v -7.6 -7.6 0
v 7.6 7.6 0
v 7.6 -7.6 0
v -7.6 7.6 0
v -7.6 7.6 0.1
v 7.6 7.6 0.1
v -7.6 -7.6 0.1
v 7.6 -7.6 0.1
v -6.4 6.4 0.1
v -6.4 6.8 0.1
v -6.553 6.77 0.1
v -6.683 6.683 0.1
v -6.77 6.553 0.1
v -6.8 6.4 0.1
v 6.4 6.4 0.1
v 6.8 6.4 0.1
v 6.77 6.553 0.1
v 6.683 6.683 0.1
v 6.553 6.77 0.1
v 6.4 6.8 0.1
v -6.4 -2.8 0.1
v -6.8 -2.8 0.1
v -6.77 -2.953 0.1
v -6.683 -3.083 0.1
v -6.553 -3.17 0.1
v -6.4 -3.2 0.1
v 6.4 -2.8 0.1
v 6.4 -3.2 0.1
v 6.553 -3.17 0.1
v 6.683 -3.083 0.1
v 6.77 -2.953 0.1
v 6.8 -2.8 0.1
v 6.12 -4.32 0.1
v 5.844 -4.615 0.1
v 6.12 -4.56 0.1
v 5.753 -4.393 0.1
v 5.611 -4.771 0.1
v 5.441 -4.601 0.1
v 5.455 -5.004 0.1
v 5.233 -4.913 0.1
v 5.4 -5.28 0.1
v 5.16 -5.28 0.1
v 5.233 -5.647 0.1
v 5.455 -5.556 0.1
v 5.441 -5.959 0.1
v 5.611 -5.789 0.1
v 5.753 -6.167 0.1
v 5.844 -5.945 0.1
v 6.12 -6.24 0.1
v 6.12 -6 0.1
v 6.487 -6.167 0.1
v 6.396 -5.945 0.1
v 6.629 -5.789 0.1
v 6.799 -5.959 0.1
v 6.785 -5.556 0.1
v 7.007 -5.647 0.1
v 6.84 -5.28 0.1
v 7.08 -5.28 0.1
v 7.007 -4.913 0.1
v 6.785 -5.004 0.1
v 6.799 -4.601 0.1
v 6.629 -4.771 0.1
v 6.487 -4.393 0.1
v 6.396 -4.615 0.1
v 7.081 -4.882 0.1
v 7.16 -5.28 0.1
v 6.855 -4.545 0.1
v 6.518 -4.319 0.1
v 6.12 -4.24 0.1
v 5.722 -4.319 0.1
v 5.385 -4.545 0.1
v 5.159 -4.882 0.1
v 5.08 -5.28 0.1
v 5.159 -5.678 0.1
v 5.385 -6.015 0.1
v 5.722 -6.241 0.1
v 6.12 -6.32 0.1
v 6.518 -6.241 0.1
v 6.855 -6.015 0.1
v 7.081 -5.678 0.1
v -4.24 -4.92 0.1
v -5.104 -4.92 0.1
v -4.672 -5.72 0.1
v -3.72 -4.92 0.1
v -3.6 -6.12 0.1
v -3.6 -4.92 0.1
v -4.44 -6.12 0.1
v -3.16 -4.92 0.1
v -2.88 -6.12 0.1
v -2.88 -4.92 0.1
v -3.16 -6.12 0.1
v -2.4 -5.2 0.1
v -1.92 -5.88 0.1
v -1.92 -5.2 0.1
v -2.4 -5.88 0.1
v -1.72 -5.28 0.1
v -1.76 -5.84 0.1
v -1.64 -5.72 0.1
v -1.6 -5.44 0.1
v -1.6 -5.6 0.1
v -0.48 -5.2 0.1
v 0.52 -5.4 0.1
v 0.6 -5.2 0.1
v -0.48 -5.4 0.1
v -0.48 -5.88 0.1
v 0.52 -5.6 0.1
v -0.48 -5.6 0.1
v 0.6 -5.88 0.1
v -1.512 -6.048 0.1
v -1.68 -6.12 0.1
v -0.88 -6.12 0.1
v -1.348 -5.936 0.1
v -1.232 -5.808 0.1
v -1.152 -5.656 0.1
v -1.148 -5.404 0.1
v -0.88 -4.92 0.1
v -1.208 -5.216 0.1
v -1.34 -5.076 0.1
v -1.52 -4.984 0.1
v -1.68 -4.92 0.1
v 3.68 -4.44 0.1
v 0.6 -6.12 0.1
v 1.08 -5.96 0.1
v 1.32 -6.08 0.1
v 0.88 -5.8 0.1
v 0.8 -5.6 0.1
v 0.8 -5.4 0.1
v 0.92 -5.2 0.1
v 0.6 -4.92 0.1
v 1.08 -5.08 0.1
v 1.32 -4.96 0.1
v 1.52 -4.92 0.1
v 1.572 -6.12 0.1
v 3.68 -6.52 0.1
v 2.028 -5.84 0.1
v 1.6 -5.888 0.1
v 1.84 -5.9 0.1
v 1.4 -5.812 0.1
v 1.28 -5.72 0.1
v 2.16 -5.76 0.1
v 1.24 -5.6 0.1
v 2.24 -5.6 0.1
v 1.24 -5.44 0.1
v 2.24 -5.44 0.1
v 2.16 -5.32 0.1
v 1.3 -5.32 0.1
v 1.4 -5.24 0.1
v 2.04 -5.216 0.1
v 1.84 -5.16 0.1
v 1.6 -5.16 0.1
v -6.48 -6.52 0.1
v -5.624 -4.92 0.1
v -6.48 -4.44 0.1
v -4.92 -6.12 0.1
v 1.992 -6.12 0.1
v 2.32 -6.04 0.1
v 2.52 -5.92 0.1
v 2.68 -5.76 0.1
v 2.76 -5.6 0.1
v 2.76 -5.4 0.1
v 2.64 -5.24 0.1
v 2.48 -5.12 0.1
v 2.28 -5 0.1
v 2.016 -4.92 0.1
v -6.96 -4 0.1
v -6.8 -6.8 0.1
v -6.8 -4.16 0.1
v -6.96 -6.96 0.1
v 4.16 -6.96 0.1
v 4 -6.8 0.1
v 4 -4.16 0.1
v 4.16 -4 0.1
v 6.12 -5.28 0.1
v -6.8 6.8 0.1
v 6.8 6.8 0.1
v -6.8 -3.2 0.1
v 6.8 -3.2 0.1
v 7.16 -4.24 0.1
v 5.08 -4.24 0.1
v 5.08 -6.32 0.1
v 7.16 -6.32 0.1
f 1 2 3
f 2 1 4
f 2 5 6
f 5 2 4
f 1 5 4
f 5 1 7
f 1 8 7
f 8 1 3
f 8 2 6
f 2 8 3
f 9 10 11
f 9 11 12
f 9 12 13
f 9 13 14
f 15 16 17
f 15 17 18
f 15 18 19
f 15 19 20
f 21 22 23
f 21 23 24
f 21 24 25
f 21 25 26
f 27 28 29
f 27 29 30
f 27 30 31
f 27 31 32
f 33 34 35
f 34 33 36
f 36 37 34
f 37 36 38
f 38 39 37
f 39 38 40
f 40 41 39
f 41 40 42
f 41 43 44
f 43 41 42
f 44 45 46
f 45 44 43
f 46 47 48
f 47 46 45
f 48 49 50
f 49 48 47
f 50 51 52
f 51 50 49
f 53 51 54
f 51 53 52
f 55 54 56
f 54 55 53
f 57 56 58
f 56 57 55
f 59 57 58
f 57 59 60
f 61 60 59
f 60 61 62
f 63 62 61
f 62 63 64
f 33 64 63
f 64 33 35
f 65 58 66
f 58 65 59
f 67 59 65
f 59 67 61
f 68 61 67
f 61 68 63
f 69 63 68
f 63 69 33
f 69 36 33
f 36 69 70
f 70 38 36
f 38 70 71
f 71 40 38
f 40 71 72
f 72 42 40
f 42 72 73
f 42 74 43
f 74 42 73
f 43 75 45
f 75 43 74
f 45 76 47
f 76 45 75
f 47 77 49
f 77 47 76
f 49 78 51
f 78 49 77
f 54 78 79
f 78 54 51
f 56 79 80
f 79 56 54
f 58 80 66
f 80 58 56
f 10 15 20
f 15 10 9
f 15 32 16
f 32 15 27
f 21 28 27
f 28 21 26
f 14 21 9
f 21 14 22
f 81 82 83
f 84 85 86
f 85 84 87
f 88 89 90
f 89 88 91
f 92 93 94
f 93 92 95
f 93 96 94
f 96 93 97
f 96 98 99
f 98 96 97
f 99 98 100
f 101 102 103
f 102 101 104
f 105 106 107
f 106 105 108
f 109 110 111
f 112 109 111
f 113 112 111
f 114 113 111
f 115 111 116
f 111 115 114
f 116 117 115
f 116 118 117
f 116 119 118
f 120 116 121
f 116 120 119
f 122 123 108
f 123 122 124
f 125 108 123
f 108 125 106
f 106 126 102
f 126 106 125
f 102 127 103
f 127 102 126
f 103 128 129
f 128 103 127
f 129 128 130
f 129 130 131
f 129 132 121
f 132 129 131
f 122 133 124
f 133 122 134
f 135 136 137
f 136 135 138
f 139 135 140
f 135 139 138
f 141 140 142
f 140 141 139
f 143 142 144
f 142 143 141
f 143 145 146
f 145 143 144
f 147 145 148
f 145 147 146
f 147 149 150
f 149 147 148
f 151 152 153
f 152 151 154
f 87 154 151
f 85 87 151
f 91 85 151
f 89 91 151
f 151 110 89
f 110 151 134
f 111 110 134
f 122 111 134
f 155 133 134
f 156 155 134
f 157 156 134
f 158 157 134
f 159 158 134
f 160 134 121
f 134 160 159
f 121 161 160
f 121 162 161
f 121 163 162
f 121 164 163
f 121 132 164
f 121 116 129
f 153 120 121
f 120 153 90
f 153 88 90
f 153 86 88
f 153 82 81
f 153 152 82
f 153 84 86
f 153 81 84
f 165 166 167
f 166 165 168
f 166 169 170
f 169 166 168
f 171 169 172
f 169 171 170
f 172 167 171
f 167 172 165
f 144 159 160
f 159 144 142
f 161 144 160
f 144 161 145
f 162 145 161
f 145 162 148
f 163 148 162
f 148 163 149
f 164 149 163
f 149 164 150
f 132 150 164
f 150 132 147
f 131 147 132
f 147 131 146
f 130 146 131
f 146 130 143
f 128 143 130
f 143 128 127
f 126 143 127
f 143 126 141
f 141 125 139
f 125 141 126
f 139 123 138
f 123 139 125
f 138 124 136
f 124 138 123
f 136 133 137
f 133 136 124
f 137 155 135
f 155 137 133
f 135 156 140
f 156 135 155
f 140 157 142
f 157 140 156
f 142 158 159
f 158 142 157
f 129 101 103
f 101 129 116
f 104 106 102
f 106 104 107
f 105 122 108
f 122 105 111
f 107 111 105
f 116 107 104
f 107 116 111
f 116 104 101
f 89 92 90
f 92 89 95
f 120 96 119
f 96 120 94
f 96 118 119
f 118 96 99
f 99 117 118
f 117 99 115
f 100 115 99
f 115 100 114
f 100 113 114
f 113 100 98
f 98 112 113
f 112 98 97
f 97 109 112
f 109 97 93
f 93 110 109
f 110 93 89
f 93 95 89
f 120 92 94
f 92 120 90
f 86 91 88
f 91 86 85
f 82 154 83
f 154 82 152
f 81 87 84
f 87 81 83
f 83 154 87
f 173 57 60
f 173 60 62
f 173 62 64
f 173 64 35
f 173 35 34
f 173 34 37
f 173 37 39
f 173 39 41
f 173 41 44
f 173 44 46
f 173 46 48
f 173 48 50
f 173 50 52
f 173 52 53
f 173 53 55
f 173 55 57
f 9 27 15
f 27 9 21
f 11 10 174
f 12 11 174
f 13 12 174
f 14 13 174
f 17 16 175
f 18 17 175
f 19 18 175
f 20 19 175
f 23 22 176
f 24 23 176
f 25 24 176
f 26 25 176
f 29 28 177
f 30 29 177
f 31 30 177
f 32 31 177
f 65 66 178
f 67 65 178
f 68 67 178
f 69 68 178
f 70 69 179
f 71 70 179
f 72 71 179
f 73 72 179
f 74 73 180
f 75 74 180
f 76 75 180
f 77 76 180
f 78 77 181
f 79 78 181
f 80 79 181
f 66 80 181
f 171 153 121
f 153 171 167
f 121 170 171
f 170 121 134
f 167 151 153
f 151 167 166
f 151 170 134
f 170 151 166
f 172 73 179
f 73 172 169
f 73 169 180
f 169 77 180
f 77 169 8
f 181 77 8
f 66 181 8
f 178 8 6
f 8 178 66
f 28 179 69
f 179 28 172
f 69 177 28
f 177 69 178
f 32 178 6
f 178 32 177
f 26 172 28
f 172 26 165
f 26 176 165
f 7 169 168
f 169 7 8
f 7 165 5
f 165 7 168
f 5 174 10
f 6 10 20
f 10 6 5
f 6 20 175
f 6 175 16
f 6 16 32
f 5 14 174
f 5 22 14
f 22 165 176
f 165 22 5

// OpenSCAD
// file: ../p/box5-12.scad
use <../lib.scad>
function ldraw_lib__box5_12() = [
// 0 Box with 5 Faces without Any Edges
// 0 Name: box5-12.dat
// 0 Author: Chris Dee [cwdee]
// 0 !LDRAW_ORG Primitive UPDATE 2009-02
// 0 !LICENSE Licensed under CC BY 4.0 : see CAreadme.txt
// 
// 0 BFC CERTIFY CCW
  [0,"BFC","CERTIFY"],
  [0,"BFC","CCW"],
// 
// 0 !HISTORY 2009-09-03 [PTadmin] Official Update 2009-02
// 
// 
// 4 16 1 1 1 1 1 -1 -1 1 -1 -1 1 1
  [4,16,1,1,1,1,1,-1,-1,1,-1,-1,1,1],
// 4 16 -1 0 1 1 0 1 1 1 1 -1 1 1
  [4,16,-1,0,1,1,0,1,1,1,1,-1,1,1],
// 4 16 -1 0 -1 -1 0 1 -1 1 1 -1 1 -1
  [4,16,-1,0,-1,-1,0,1,-1,1,1,-1,1,-1],
// 4 16 1 0 -1 -1 0 -1 -1 1 -1 1 1 -1
  [4,16,1,0,-1,-1,0,-1,-1,1,-1,1,1,-1],
// 4 16 1 0 1 1 0 -1 1 1 -1 1 1 1
  [4,16,1,0,1,1,0,-1,1,1,-1,1,1,1],
// 0
];
module ldraw_lib__box5_12(step=0, col=false, unit=2/5, alt=false, line=0.2, solid=!$preview)
    makepoly(ldraw_lib__box5_12(), step=step, col=col, unit=unit, alt=alt, line=line, solid=solid);
ldraw_lib__box5_12(line=0.2);
// file: ../p/4-4ring3.scad
use <../lib.scad>
function ldraw_lib__4_4ring3() = [
// 0 Ring  3 x 1.0
// 0 Name: 4-4ring3.dat
// 0 Author: James Jessiman
// 0 !LDRAW_ORG Primitive UPDATE 2009-01
// 0 !LICENSE Licensed under CC BY 2.0 and CC BY 4.0 : see CAreadme.txt
// 
// 0 BFC CERTIFY CCW
  [0,"BFC","CERTIFY"],
  [0,"BFC","CCW"],
// 
// 0 !HISTORY 1998-12-15 [PTadmin] Official Update 1998-10
// 0 !HISTORY 2002-04-05 [hafhead] Added BFC statement
// 0 !HISTORY 2002-04-25 [PTadmin] Official Update 2002-02
// 0 !HISTORY 2007-06-24 [PTadmin] Header formatted for Contributor Agreement
// 0 !HISTORY 2008-07-01 [PTadmin] Official Update 2008-01
// 0 !HISTORY 2008-08-26 [cwdee] Switch polygon winding and rename
// 0 !HISTORY 2009-05-02 [PTadmin] Official Update 2009-01
// 
// 
// 4 16 -1.5308 0 3.6956 -1.1481 0 2.7717 0 0 3 0 0 4
  [4,16,-1.5308,0,3.6956,-1.1481,0,2.7717,0,0,3,0,0,4],
// 4 16 -2.8284 0 2.8284 -2.1213 0 2.1213 -1.1481 0 2.7717 -1.5308 0 3.6956
  [4,16,-2.8284,0,2.8284,-2.1213,0,2.1213,-1.1481,0,2.7717,-1.5308,0,3.6956],
// 4 16 -3.6956 0 1.5308 -2.7717 0 1.1481 -2.1213 0 2.1213 -2.8284 0 2.8284
  [4,16,-3.6956,0,1.5308,-2.7717,0,1.1481,-2.1213,0,2.1213,-2.8284,0,2.8284],
// 4 16 -4 0 0 -3 0 0 -2.7717 0 1.1481 -3.6956 0 1.5308
  [4,16,-4,0,0,-3,0,0,-2.7717,0,1.1481,-3.6956,0,1.5308],
// 4 16 -3.6956 0 -1.5308 -2.7717 0 -1.1481 -3 0 0 -4 0 0
  [4,16,-3.6956,0,-1.5308,-2.7717,0,-1.1481,-3,0,0,-4,0,0],
// 4 16 -2.8284 0 -2.8284 -2.1213 0 -2.1213 -2.7717 0 -1.1481 -3.6956 0 -1.5308
  [4,16,-2.8284,0,-2.8284,-2.1213,0,-2.1213,-2.7717,0,-1.1481,-3.6956,0,-1.5308],
// 4 16 -1.5308 0 -3.6956 -1.1481 0 -2.7717 -2.1213 0 -2.1213 -2.8284 0 -2.8284
  [4,16,-1.5308,0,-3.6956,-1.1481,0,-2.7717,-2.1213,0,-2.1213,-2.8284,0,-2.8284],
// 4 16 0 0 -4 0 0 -3 -1.1481 0 -2.7717 -1.5308 0 -3.6956
  [4,16,0,0,-4,0,0,-3,-1.1481,0,-2.7717,-1.5308,0,-3.6956],
// 4 16 1.5308 0 -3.6956 1.1481 0 -2.7717 0 0 -3 0 0 -4
  [4,16,1.5308,0,-3.6956,1.1481,0,-2.7717,0,0,-3,0,0,-4],
// 4 16 2.8284 0 -2.8284 2.1213 0 -2.1213 1.1481 0 -2.7717 1.5308 0 -3.6956
  [4,16,2.8284,0,-2.8284,2.1213,0,-2.1213,1.1481,0,-2.7717,1.5308,0,-3.6956],
// 4 16 3.6956 0 -1.5308 2.7717 0 -1.1481 2.1213 0 -2.1213 2.8284 0 -2.8284
  [4,16,3.6956,0,-1.5308,2.7717,0,-1.1481,2.1213,0,-2.1213,2.8284,0,-2.8284],
// 4 16 4 0 0 3 0 0 2.7717 0 -1.1481 3.6956 0 -1.5308
  [4,16,4,0,0,3,0,0,2.7717,0,-1.1481,3.6956,0,-1.5308],
// 4 16 3.6956 0 1.5308 2.7717 0 1.1481 3 0 0 4 0 0
  [4,16,3.6956,0,1.5308,2.7717,0,1.1481,3,0,0,4,0,0],
// 4 16 2.8284 0 2.8284 2.1213 0 2.1213 2.7717 0 1.1481 3.6956 0 1.5308
  [4,16,2.8284,0,2.8284,2.1213,0,2.1213,2.7717,0,1.1481,3.6956,0,1.5308],
// 4 16 1.5308 0 3.6956 1.1481 0 2.7717 2.1213 0 2.1213 2.8284 0 2.8284
  [4,16,1.5308,0,3.6956,1.1481,0,2.7717,2.1213,0,2.1213,2.8284,0,2.8284],
// 4 16 0 0 4 0 0 3 1.1481 0 2.7717 1.5308 0 3.6956
  [4,16,0,0,4,0,0,3,1.1481,0,2.7717,1.5308,0,3.6956],
// 0
];
module ldraw_lib__4_4ring3(step=0, col=false, unit=2/5, alt=false, line=0.2, solid=!$preview)
    makepoly(ldraw_lib__4_4ring3(), step=step, col=col, unit=unit, alt=alt, line=line, solid=solid);
ldraw_lib__4_4ring3(line=0.2);
// file: ../p/4-4rin12.scad
use <../lib.scad>
function ldraw_lib__4_4rin12() = [
// 0 Ring 12 x 1.0
// 0 Name: 4-4rin12.dat
// 0 Author: John Riley [jriley]
// 0 !LDRAW_ORG Primitive UPDATE 2003-03
// 0 !LICENSE Licensed under CC BY 2.0 and CC BY 4.0 : see CAreadme.txt
// 
// 0 BFC CERTIFY CCW
  [0,"BFC","CERTIFY"],
  [0,"BFC","CCW"],
// 
// 0 !HISTORY 2003-12-19 [PTadmin] Official Update 2003-03
// 0 !HISTORY 2007-06-24 [PTadmin] Header formatted for Contributor Agreement
// 0 !HISTORY 2008-07-01 [PTadmin] Official Update 2008-01
// 
// 
// 4 16 12 0 0 13 0 0 12.0107 0 4.9751 11.0868 0 4.5924
  [4,16,12,0,0,13,0,0,12.0107,0,4.9751,11.0868,0,4.5924],
// 4 16 11.0868 0 4.5924 12.0107 0 4.9751 9.1923 0 9.1923 8.4852 0 8.4852
  [4,16,11.0868,0,4.5924,12.0107,0,4.9751,9.1923,0,9.1923,8.4852,0,8.4852],
// 4 16 8.4852 0 8.4852 9.1923 0 9.1923 4.9751 0 12.0107 4.5924 0 11.0868
  [4,16,8.4852,0,8.4852,9.1923,0,9.1923,4.9751,0,12.0107,4.5924,0,11.0868],
// 4 16 4.5924 0 11.0868 4.9751 0 12.0107 0 0 13 0 0 12
  [4,16,4.5924,0,11.0868,4.9751,0,12.0107,0,0,13,0,0,12],
// 4 16 0 0 12 0 0 13 -4.9751 0 12.0107 -4.5924 0 11.0868
  [4,16,0,0,12,0,0,13,-4.9751,0,12.0107,-4.5924,0,11.0868],
// 4 16 -4.5924 0 11.0868 -4.9751 0 12.0107 -9.1923 0 9.1923 -8.4852 0 8.4852
  [4,16,-4.5924,0,11.0868,-4.9751,0,12.0107,-9.1923,0,9.1923,-8.4852,0,8.4852],
// 4 16 -8.4852 0 8.4852 -9.1923 0 9.1923 -12.0107 0 4.9751 -11.0868 0 4.5924
  [4,16,-8.4852,0,8.4852,-9.1923,0,9.1923,-12.0107,0,4.9751,-11.0868,0,4.5924],
// 4 16 -11.0868 0 4.5924 -12.0107 0 4.9751 -13 0 0 -12 0 0
  [4,16,-11.0868,0,4.5924,-12.0107,0,4.9751,-13,0,0,-12,0,0],
// 4 16 -12 0 0 -13 0 0 -12.0107 0 -4.9751 -11.0868 0 -4.5924
  [4,16,-12,0,0,-13,0,0,-12.0107,0,-4.9751,-11.0868,0,-4.5924],
// 4 16 -11.0868 0 -4.5924 -12.0107 0 -4.9751 -9.1923 0 -9.1923 -8.4852 0 -8.4852
  [4,16,-11.0868,0,-4.5924,-12.0107,0,-4.9751,-9.1923,0,-9.1923,-8.4852,0,-8.4852],
// 4 16 -8.4852 0 -8.4852 -9.1923 0 -9.1923 -4.9751 0 -12.0107 -4.5924 0 -11.0868
  [4,16,-8.4852,0,-8.4852,-9.1923,0,-9.1923,-4.9751,0,-12.0107,-4.5924,0,-11.0868],
// 4 16 -4.5924 0 -11.0868 -4.9751 0 -12.0107 0 0 -13 0 0 -12
  [4,16,-4.5924,0,-11.0868,-4.9751,0,-12.0107,0,0,-13,0,0,-12],
// 4 16 0 0 -12 0 0 -13 4.9751 0 -12.0107 4.5924 0 -11.0868
  [4,16,0,0,-12,0,0,-13,4.9751,0,-12.0107,4.5924,0,-11.0868],
// 4 16 4.5924 0 -11.0868 4.9751 0 -12.0107 9.1923 0 -9.1923 8.4852 0 -8.4852
  [4,16,4.5924,0,-11.0868,4.9751,0,-12.0107,9.1923,0,-9.1923,8.4852,0,-8.4852],
// 4 16 8.4852 0 -8.4852 9.1923 0 -9.1923 12.0107 0 -4.9751 11.0868 0 -4.5924
  [4,16,8.4852,0,-8.4852,9.1923,0,-9.1923,12.0107,0,-4.9751,11.0868,0,-4.5924],
// 4 16 11.0868 0 -4.5924 12.0107 0 -4.9751 13 0 0 12 0 0
  [4,16,11.0868,0,-4.5924,12.0107,0,-4.9751,13,0,0,12,0,0],
// 0
// 
];
module ldraw_lib__4_4rin12(step=0, col=false, unit=2/5, alt=false, line=0.2, solid=!$preview)
    makepoly(ldraw_lib__4_4rin12(), step=step, col=col, unit=unit, alt=alt, line=line, solid=solid);
ldraw_lib__4_4rin12(line=0.2);
// file: ../p/4-4ndis.scad
use <../lib.scad>
function ldraw_lib__4_4ndis() = [
// 0 Disc Negative 1.0
// 0 Name: 4-4ndis.dat
// 0 Author: James Jessiman
// 0 !LDRAW_ORG Primitive UPDATE 2012-01
// 0 !LICENSE Licensed under CC BY 4.0 : see CAreadme.txt
// 
// 0 BFC CERTIFY CCW
  [0,"BFC","CERTIFY"],
  [0,"BFC","CCW"],
// 
// 0 !HISTORY 2002-03-23 [sbliss] Added BFC statement; compacted code
// 0 !HISTORY 2002-04-25 [PTadmin] Official Update 2002-02
// 0 !HISTORY 2007-06-24 [PTadmin] Header formatted for Contributor Agreement
// 0 !HISTORY 2008-07-01 [PTadmin] Official Update 2008-01
// 0 !HISTORY 2012-02-16 [Philo] Changed to CCW
// 0 !HISTORY 2012-03-30 [PTadmin] Official Update 2012-01
// 
// 
// 3 16 0.9239 0 0.3827 1 0 0 1 0 1
  [3,16,0.9239,0,0.3827,1,0,0,1,0,1],
// 3 16 0.7071 0 0.7071 0.9239 0 0.3827 1 0 1
  [3,16,0.7071,0,0.7071,0.9239,0,0.3827,1,0,1],
// 3 16 0.3827 0 0.9239 0.7071 0 0.7071 1 0 1
  [3,16,0.3827,0,0.9239,0.7071,0,0.7071,1,0,1],
// 3 16 0 0 1 0.3827 0 0.9239 1 0 1
  [3,16,0,0,1,0.3827,0,0.9239,1,0,1],
// 3 16 -0.3827 0 0.9239 0 0 1 -1 0 1
  [3,16,-0.3827,0,0.9239,0,0,1,-1,0,1],
// 3 16 -0.7071 0 0.7071 -0.3827 0 0.9239 -1 0 1
  [3,16,-0.7071,0,0.7071,-0.3827,0,0.9239,-1,0,1],
// 3 16 -0.9239 0 0.3827 -0.7071 0 0.7071 -1 0 1
  [3,16,-0.9239,0,0.3827,-0.7071,0,0.7071,-1,0,1],
// 3 16 -1 0 0 -0.9239 0 0.3827 -1 0 1
  [3,16,-1,0,0,-0.9239,0,0.3827,-1,0,1],
// 3 16 -0.9239 0 -0.3827 -1 0 0 -1 0 -1
  [3,16,-0.9239,0,-0.3827,-1,0,0,-1,0,-1],
// 3 16 -0.7071 0 -0.7071 -0.9239 0 -0.3827 -1 0 -1
  [3,16,-0.7071,0,-0.7071,-0.9239,0,-0.3827,-1,0,-1],
// 3 16 -0.3827 0 -0.9239 -0.7071 0 -0.7071 -1 0 -1
  [3,16,-0.3827,0,-0.9239,-0.7071,0,-0.7071,-1,0,-1],
// 3 16 0 0 -1 -0.3827 0 -0.9239 -1 0 -1
  [3,16,0,0,-1,-0.3827,0,-0.9239,-1,0,-1],
// 3 16 0.3827 0 -0.9239 0 0 -1 1 0 -1
  [3,16,0.3827,0,-0.9239,0,0,-1,1,0,-1],
// 3 16 0.7071 0 -0.7071 0.3827 0 -0.9239 1 0 -1
  [3,16,0.7071,0,-0.7071,0.3827,0,-0.9239,1,0,-1],
// 3 16 0.9239 0 -0.3827 0.7071 0 -0.7071 1 0 -1
  [3,16,0.9239,0,-0.3827,0.7071,0,-0.7071,1,0,-1],
// 3 16 1 0 0 0.9239 0 -0.3827 1 0 -1
  [3,16,1,0,0,0.9239,0,-0.3827,1,0,-1],
];
module ldraw_lib__4_4ndis(step=0, col=false, unit=2/5, alt=false, line=0.2, solid=!$preview)
    makepoly(ldraw_lib__4_4ndis(), step=step, col=col, unit=unit, alt=alt, line=line, solid=solid);
ldraw_lib__4_4ndis(line=0.2);
// file: ../p/4-4disc.scad
use <../lib.scad>
function ldraw_lib__4_4disc() = [
// 0 Disc 1.0
// 0 Name: 4-4disc.dat
// 0 Author: James Jessiman
// 0 !LDRAW_ORG Primitive UPDATE 2002-02
// 0 !LICENSE Licensed under CC BY 4.0 : see CAreadme.txt
// 
// 0 BFC CERTIFY CCW
  [0,"BFC","CERTIFY"],
  [0,"BFC","CCW"],
// 
// 0 !HISTORY 1998-12-15 [PTadmin] Official Update 1998-10
// 0 !HISTORY 2002-03-23 [sbliss] Added BFC statement
// 0 !HISTORY 2002-04-25 [PTadmin] Official Update 2002-02
// 0 !HISTORY 2007-06-24 [PTadmin] Header formatted for Contributor Agreement
// 0 !HISTORY 2008-07-01 [PTadmin] Official Update 2008-01
// 
// 
// 3 16 0 0 0 1 0 0 0.9239 0 0.3827
  [3,16,0,0,0,1,0,0,0.9239,0,0.3827],
// 3 16 0 0 0 0.9239 0 0.3827 0.7071 0 0.7071
  [3,16,0,0,0,0.9239,0,0.3827,0.7071,0,0.7071],
// 3 16 0 0 0 0.7071 0 0.7071 0.3827 0 0.9239
  [3,16,0,0,0,0.7071,0,0.7071,0.3827,0,0.9239],
// 3 16 0 0 0 0.3827 0 0.9239 0 0 1
  [3,16,0,0,0,0.3827,0,0.9239,0,0,1],
// 3 16 0 0 0 0 0 1 -0.3827 0 0.9239
  [3,16,0,0,0,0,0,1,-0.3827,0,0.9239],
// 3 16 0 0 0 -0.3827 0 0.9239 -0.7071 0 0.7071
  [3,16,0,0,0,-0.3827,0,0.9239,-0.7071,0,0.7071],
// 3 16 0 0 0 -0.7071 0 0.7071 -0.9239 0 0.3827
  [3,16,0,0,0,-0.7071,0,0.7071,-0.9239,0,0.3827],
// 3 16 0 0 0 -0.9239 0 0.3827 -1 0 -0
  [3,16,0,0,0,-0.9239,0,0.3827,-1,0,-0],
// 3 16 0 0 0 -1 0 -0 -0.9239 0 -0.3827
  [3,16,0,0,0,-1,0,-0,-0.9239,0,-0.3827],
// 3 16 0 0 0 -0.9239 0 -0.3827 -0.7071 0 -0.7071
  [3,16,0,0,0,-0.9239,0,-0.3827,-0.7071,0,-0.7071],
// 3 16 0 0 0 -0.7071 0 -0.7071 -0.3827 0 -0.9239
  [3,16,0,0,0,-0.7071,0,-0.7071,-0.3827,0,-0.9239],
// 3 16 0 0 0 -0.3827 0 -0.9239 0 0 -1
  [3,16,0,0,0,-0.3827,0,-0.9239,0,0,-1],
// 3 16 0 0 0 0 0 -1 0.3827 0 -0.9239
  [3,16,0,0,0,0,0,-1,0.3827,0,-0.9239],
// 3 16 0 0 0 0.3827 0 -0.9239 0.7071 0 -0.7071
  [3,16,0,0,0,0.3827,0,-0.9239,0.7071,0,-0.7071],
// 3 16 0 0 0 0.7071 0 -0.7071 0.9239 0 -0.3827
  [3,16,0,0,0,0.7071,0,-0.7071,0.9239,0,-0.3827],
// 3 16 0 0 0 0.9239 0 -0.3827 1 0 0
  [3,16,0,0,0,0.9239,0,-0.3827,1,0,0],
// 0
];
module ldraw_lib__4_4disc(step=0, col=false, unit=2/5, alt=false, line=0.2, solid=!$preview)
    makepoly(ldraw_lib__4_4disc(), step=step, col=col, unit=unit, alt=alt, line=line, solid=solid);
ldraw_lib__4_4disc(line=0.2);
// file: ../p/1-4ndis.scad
use <../lib.scad>
function ldraw_lib__1_4ndis() = [
// 0 Disc Negative 0.25
// 0 Name: 1-4ndis.dat
// 0 Author: James Jessiman
// 0 !LDRAW_ORG Primitive UPDATE 2012-01
// 0 !LICENSE Licensed under CC BY 4.0 : see CAreadme.txt
// 
// 0 BFC CERTIFY CCW
  [0,"BFC","CERTIFY"],
  [0,"BFC","CCW"],
// 
// 0 !HISTORY 2002-03-23 [sbliss] Added BFC Statement
// 0 !HISTORY 2002-04-25 [PTadmin] Official Update 2002-02
// 0 !HISTORY 2007-06-22 [PTadmin] Header formatted for Contributor Agreement
// 0 !HISTORY 2008-07-01 [PTadmin] Official Update 2008-01
// 0 !HISTORY 2012-02-16 [Philo] Changed to CCW
// 0 !HISTORY 2012-03-30 [PTadmin] Official Update 2012-01
// 
// 
// 3 16 0.9239 0 0.3827 1 0 0 1 0 1
  [3,16,0.9239,0,0.3827,1,0,0,1,0,1],
// 3 16 0.7071 0 0.7071 0.9239 0 0.3827 1 0 1
  [3,16,0.7071,0,0.7071,0.9239,0,0.3827,1,0,1],
// 3 16 0.3827 0 0.9239 0.7071 0 0.7071 1 0 1
  [3,16,0.3827,0,0.9239,0.7071,0,0.7071,1,0,1],
// 3 16 0 0 1 0.3827 0 0.9239 1 0 1
  [3,16,0,0,1,0.3827,0,0.9239,1,0,1],
];
module ldraw_lib__1_4ndis(step=0, col=false, unit=2/5, alt=false, line=0.2, solid=!$preview)
    makepoly(ldraw_lib__1_4ndis(), step=step, col=col, unit=unit, alt=alt, line=line, solid=solid);
ldraw_lib__1_4ndis(line=0.2);
// file: ../p/1-4disc.scad
use <../lib.scad>
function ldraw_lib__1_4disc() = [
// 0 Disc 0.25
// 0 Name: 1-4disc.dat
// 0 Author: James Jessiman
// 0 !LDRAW_ORG Primitive UPDATE 2002-02
// 0 !LICENSE Licensed under CC BY 4.0 : see CAreadme.txt
// 
// 0 BFC CERTIFY CCW
  [0,"BFC","CERTIFY"],
  [0,"BFC","CCW"],
// 
// 0 !HISTORY 2002-03-23 [sbliss] Added BFC statement.
// 0 !HISTORY 2002-04-25 [PTadmin] Official Update 2002-02
// 0 !HISTORY 2007-06-22 [PTadmin] Header formatted for Contributor Agreement
// 0 !HISTORY 2008-07-01 [PTadmin] Official Update 2008-01
// 
// 
// 3 16 0 0 0 1 0 0 0.9239 0 0.3827
  [3,16,0,0,0,1,0,0,0.9239,0,0.3827],
// 3 16 0 0 0 0.9239 0 0.3827 0.7071 0 0.7071
  [3,16,0,0,0,0.9239,0,0.3827,0.7071,0,0.7071],
// 3 16 0 0 0 0.7071 0 0.7071 0.3827 0 0.9239
  [3,16,0,0,0,0.7071,0,0.7071,0.3827,0,0.9239],
// 3 16 0 0 0 0.3827 0 0.9239 0 0 1
  [3,16,0,0,0,0.3827,0,0.9239,0,0,1],
// 0
];
module ldraw_lib__1_4disc(step=0, col=false, unit=2/5, alt=false, line=0.2, solid=!$preview)
    makepoly(ldraw_lib__1_4disc(), step=step, col=col, unit=unit, alt=alt, line=line, solid=solid);
ldraw_lib__1_4disc(line=0.2);
// main file
use <../lib.scad>
use <../p/1-4disc.scad>
use <../p/1-4ndis.scad>
use <../p/4-4disc.scad>
use <../p/4-4ndis.scad>
use <../p/4-4rin12.scad>
use <../p/4-4ring3.scad>
use <../p/box5-12.scad>
function ldraw_lib__4100418h() = [
// 0 Sticker  1.9 x  1.9 with Video Screen
// 0 Name: 4100418h.dat
// 0 Author: J.C. Tchang [tchang]
// 0 !LDRAW_ORG Part UPDATE 2013-01
// 0 !LICENSE Licensed under CC BY 4.0 : see CAreadme.txt
// 
// 0 BFC CERTIFY CCW
  [0,"BFC","CERTIFY"],
  [0,"BFC","CCW"],
// 
// 0 !KEYWORDS Set 5571
// 
// 0 !HISTORY 2013-07-21 [PTadmin] Official Update 2013-01
// 
// 
// 0 // Original Blue screen is made with Blue/White points
// 
// 1 16 0 -0.25 0 19 0 0 0 0.25 0 0 0 19 box5-12.dat
  [1,16,0,-0.25,0,19,0,0,0,0.25,0,0,0,19, ldraw_lib__box5_12()],
// 0 //
// 1 0 -16 -0.25 16 0 0 -1 0 1 0 1 0 0 1-4disc.dat
  [1,0,-16,-0.25,16,0,0,-1,0,1,0,1,0,0, ldraw_lib__1_4disc()],
// 1 0 16 -0.25 16 1 0 0 0 1 0 0 0 1 1-4disc.dat
  [1,0,16,-0.25,16,1,0,0,0,1,0,0,0,1, ldraw_lib__1_4disc()],
// 1 0 -16 -0.25 -7 -1 0 0 0 1 0 0 0 -1 1-4disc.dat
  [1,0,-16,-0.25,-7,-1,0,0,0,1,0,0,0,-1, ldraw_lib__1_4disc()],
// 1 0 16 -0.25 -7 0 0 1 0 1 0 -1 0 0 1-4disc.dat
  [1,0,16,-0.25,-7,0,0,1,0,1,0,-1,0,0, ldraw_lib__1_4disc()],
// 1 0 15.3 -0.25 -13.2 0.6 0 0 0 1 0 0 0 0.6 4-4ring3.dat
  [1,0,15.3,-0.25,-13.2,0.6,0,0,0,1,0,0,0,0.6, ldraw_lib__4_4ring3()],
// 1 0 15.3 -0.25 -13.2 0.2 0 0 0 1 0 0 0 0.2 4-4rin12.dat
  [1,0,15.3,-0.25,-13.2,0.2,0,0,0,1,0,0,0,0.2, ldraw_lib__4_4rin12()],
// 4 0 16 -0.25 17 -16 -0.25 17 -16 -0.25 16 16 -0.25 16
  [4,0,16,-0.25,17,-16,-0.25,17,-16,-0.25,16,16,-0.25,16],
// 4 0 17 -0.25 -7 17 -0.25 16 16 -0.25 16 16 -0.25 -7
  [4,0,17,-0.25,-7,17,-0.25,16,16,-0.25,16,16,-0.25,-7],
// 4 0 16 -0.25 -8 16 -0.25 -7 -16 -0.25 -7 -16 -0.25 -8
  [4,0,16,-0.25,-8,16,-0.25,-7,-16,-0.25,-7,-16,-0.25,-8],
// 4 0 -17 -0.25 -7 -16 -0.25 -7 -16 -0.25 16 -17 -0.25 16
  [4,0,-17,-0.25,-7,-16,-0.25,-7,-16,-0.25,16,-17,-0.25,16],
// 3 0 -10.6 -0.25 -12.3 -12.76 -0.25 -12.3 -11.68 -0.25 -14.3
  [3,0,-10.6,-0.25,-12.3,-12.76,-0.25,-12.3,-11.68,-0.25,-14.3],
// 4 0 -9.3 -0.25 -12.3 -11.1 -0.25 -15.3 -9 -0.25 -15.3 -9 -0.25 -12.3
  [4,0,-9.3,-0.25,-12.3,-11.1,-0.25,-15.3,-9,-0.25,-15.3,-9,-0.25,-12.3],
// 4 0 -7.2 -0.25 -12.3 -7.9 -0.25 -12.3 -7.9 -0.25 -15.3 -7.2 -0.25 -15.3
  [4,0,-7.2,-0.25,-12.3,-7.9,-0.25,-12.3,-7.9,-0.25,-15.3,-7.2,-0.25,-15.3],
// 4 0 -4.8 -0.25 -13 -6 -0.25 -13 -6 -0.25 -14.7 -4.8 -0.25 -14.7
  [4,0,-4.8,-0.25,-13,-6,-0.25,-13,-6,-0.25,-14.7,-4.8,-0.25,-14.7],
// 4 0 -4.3 -0.25 -13.2 -4.8 -0.25 -13 -4.8 -0.25 -14.7 -4.4 -0.25 -14.6
  [4,0,-4.3,-0.25,-13.2,-4.8,-0.25,-13,-4.8,-0.25,-14.7,-4.4,-0.25,-14.6],
// 4 0 -4 -0.25 -13.6 -4.3 -0.25 -13.2 -4.4 -0.25 -14.6 -4.1 -0.25 -14.3
  [4,0,-4,-0.25,-13.6,-4.3,-0.25,-13.2,-4.4,-0.25,-14.6,-4.1,-0.25,-14.3],
// 3 0 -4 -0.25 -13.6 -4.1 -0.25 -14.3 -4 -0.25 -14
  [3,0,-4,-0.25,-13.6,-4.1,-0.25,-14.3,-4,-0.25,-14],
// 4 0 -1.2 -0.25 -13 -1.2 -0.25 -13.5 1.3 -0.25 -13.5 1.5 -0.25 -13
  [4,0,-1.2,-0.25,-13,-1.2,-0.25,-13.5,1.3,-0.25,-13.5,1.5,-0.25,-13],
// 4 0 -1.2 -0.25 -14 -1.2 -0.25 -14.7 1.5 -0.25 -14.7 1.3 -0.25 -14
  [4,0,-1.2,-0.25,-14,-1.2,-0.25,-14.7,1.5,-0.25,-14.7,1.3,-0.25,-14],
// 3 0 -3.78 -0.25 -15.12 -4.2 -0.25 -15.3 -2.2 -0.25 -15.3
  [3,0,-3.78,-0.25,-15.12,-4.2,-0.25,-15.3,-2.2,-0.25,-15.3],
// 3 0 -3.37 -0.25 -14.84 -3.78 -0.25 -15.12 -2.2 -0.25 -15.3
  [3,0,-3.37,-0.25,-14.84,-3.78,-0.25,-15.12,-2.2,-0.25,-15.3],
// 3 0 -3.08 -0.25 -14.52 -3.37 -0.25 -14.84 -2.2 -0.25 -15.3
  [3,0,-3.08,-0.25,-14.52,-3.37,-0.25,-14.84,-2.2,-0.25,-15.3],
// 3 0 -2.88 -0.25 -14.14 -3.08 -0.25 -14.52 -2.2 -0.25 -15.3
  [3,0,-2.88,-0.25,-14.14,-3.08,-0.25,-14.52,-2.2,-0.25,-15.3],
// 4 0 -2.87 -0.25 -13.51 -2.88 -0.25 -14.14 -2.2 -0.25 -15.3 -2.2 -0.25 -12.3
  [4,0,-2.87,-0.25,-13.51,-2.88,-0.25,-14.14,-2.2,-0.25,-15.3,-2.2,-0.25,-12.3],
// 3 0 -2.2 -0.25 -12.3 -3.02 -0.25 -13.04 -2.87 -0.25 -13.51
  [3,0,-2.2,-0.25,-12.3,-3.02,-0.25,-13.04,-2.87,-0.25,-13.51],
// 3 0 -2.2 -0.25 -12.3 -3.35 -0.25 -12.69 -3.02 -0.25 -13.04
  [3,0,-2.2,-0.25,-12.3,-3.35,-0.25,-12.69,-3.02,-0.25,-13.04],
// 3 0 -2.2 -0.25 -12.3 -3.8 -0.25 -12.46 -3.35 -0.25 -12.69
  [3,0,-2.2,-0.25,-12.3,-3.8,-0.25,-12.46,-3.35,-0.25,-12.69],
// 4 0 -4.2 -0.25 -12.3 -3.8 -0.25 -12.46 -2.2 -0.25 -12.3 9.2 -0.25 -11.1
  [4,0,-4.2,-0.25,-12.3,-3.8,-0.25,-12.46,-2.2,-0.25,-12.3,9.2,-0.25,-11.1],
// 4 0 1.5 -0.25 -14.7 1.5 -0.25 -15.3 3.3 -0.25 -15.2 2.7 -0.25 -14.9
  [4,0,1.5,-0.25,-14.7,1.5,-0.25,-15.3,3.3,-0.25,-15.2,2.7,-0.25,-14.9],
// 4 0 1.5 -0.25 -14.7 2.7 -0.25 -14.9 2.2 -0.25 -14.5 1.3 -0.25 -14
  [4,0,1.5,-0.25,-14.7,2.7,-0.25,-14.9,2.2,-0.25,-14.5,1.3,-0.25,-14],
// 4 0 1.3 -0.25 -14 2.2 -0.25 -14.5 2 -0.25 -14 1.3 -0.25 -13.5
  [4,0,1.3,-0.25,-14,2.2,-0.25,-14.5,2,-0.25,-14,1.3,-0.25,-13.5],
// 4 0 1.3 -0.25 -13.5 2 -0.25 -14 2 -0.25 -13.5 1.5 -0.25 -13
  [4,0,1.3,-0.25,-13.5,2,-0.25,-14,2,-0.25,-13.5,1.5,-0.25,-13],
// 4 0 1.5 -0.25 -13 2 -0.25 -13.5 2.3 -0.25 -13 1.5 -0.25 -12.3
  [4,0,1.5,-0.25,-13,2,-0.25,-13.5,2.3,-0.25,-13,1.5,-0.25,-12.3],
// 3 0 1.5 -0.25 -12.3 2.3 -0.25 -13 2.7 -0.25 -12.7
  [3,0,1.5,-0.25,-12.3,2.3,-0.25,-13,2.7,-0.25,-12.7],
// 3 0 1.5 -0.25 -12.3 2.7 -0.25 -12.7 3.3 -0.25 -12.4
  [3,0,1.5,-0.25,-12.3,2.7,-0.25,-12.7,3.3,-0.25,-12.4],
// 4 0 1.5 -0.25 -12.3 3.3 -0.25 -12.4 3.8 -0.25 -12.3 9.2 -0.25 -11.1
  [4,0,1.5,-0.25,-12.3,3.3,-0.25,-12.4,3.8,-0.25,-12.3,9.2,-0.25,-11.1],
// 4 0 3.93 -0.25 -15.3 3.3 -0.25 -15.2 1.5 -0.25 -15.3 9.2 -0.25 -16.3
  [4,0,3.93,-0.25,-15.3,3.3,-0.25,-15.2,1.5,-0.25,-15.3,9.2,-0.25,-16.3],
// 4 0 3.5 -0.25 -14.53 4 -0.25 -14.72 4.6 -0.25 -14.75 5.07 -0.25 -14.6
  [4,0,3.5,-0.25,-14.53,4,-0.25,-14.72,4.6,-0.25,-14.75,5.07,-0.25,-14.6],
// 4 0 3.5 -0.25 -14.53 5.07 -0.25 -14.6 5.4 -0.25 -14.4 3.2 -0.25 -14.3
  [4,0,3.5,-0.25,-14.53,5.07,-0.25,-14.6,5.4,-0.25,-14.4,3.2,-0.25,-14.3],
// 4 0 3.2 -0.25 -14.3 5.4 -0.25 -14.4 5.6 -0.25 -14 3.1 -0.25 -14
  [4,0,3.2,-0.25,-14.3,5.4,-0.25,-14.4,5.6,-0.25,-14,3.1,-0.25,-14],
// 4 0 3.1 -0.25 -14 5.6 -0.25 -14 5.6 -0.25 -13.6 3.1 -0.25 -13.6
  [4,0,3.1,-0.25,-14,5.6,-0.25,-14,5.6,-0.25,-13.6,3.1,-0.25,-13.6],
// 4 0 3.1 -0.25 -13.6 5.6 -0.25 -13.6 5.4 -0.25 -13.3 3.25 -0.25 -13.3
  [4,0,3.1,-0.25,-13.6,5.6,-0.25,-13.6,5.4,-0.25,-13.3,3.25,-0.25,-13.3],
// 4 0 3.25 -0.25 -13.3 5.4 -0.25 -13.3 5.1 -0.25 -13.04 3.5 -0.25 -13.1
  [4,0,3.25,-0.25,-13.3,5.4,-0.25,-13.3,5.1,-0.25,-13.04,3.5,-0.25,-13.1],
// 4 0 3.5 -0.25 -13.1 5.1 -0.25 -13.04 4.6 -0.25 -12.9 4 -0.25 -12.9
  [4,0,3.5,-0.25,-13.1,5.1,-0.25,-13.04,4.6,-0.25,-12.9,4,-0.25,-12.9],
// 4 0 -14.06 -0.25 -12.3 -16.2 -0.25 -11.1 -16.2 -0.25 -16.3 -12.3 -0.25 -15.3
  [4,0,-14.06,-0.25,-12.3,-16.2,-0.25,-11.1,-16.2,-0.25,-16.3,-12.3,-0.25,-15.3],
// 3 0 -11.1 -0.25 -15.3 -12.3 -0.25 -15.3 -16.2 -0.25 -16.3
  [3,0,-11.1,-0.25,-15.3,-12.3,-0.25,-15.3,-16.2,-0.25,-16.3],
// 3 0 -9 -0.25 -15.3 -11.1 -0.25 -15.3 -16.2 -0.25 -16.3
  [3,0,-9,-0.25,-15.3,-11.1,-0.25,-15.3,-16.2,-0.25,-16.3],
// 3 0 -7.9 -0.25 -15.3 -9 -0.25 -15.3 -16.2 -0.25 -16.3
  [3,0,-7.9,-0.25,-15.3,-9,-0.25,-15.3,-16.2,-0.25,-16.3],
// 3 0 -7.2 -0.25 -15.3 -7.9 -0.25 -15.3 -16.2 -0.25 -16.3
  [3,0,-7.2,-0.25,-15.3,-7.9,-0.25,-15.3,-16.2,-0.25,-16.3],
// 4 0 -4.2 -0.25 -15.3 -7.2 -0.25 -15.3 -16.2 -0.25 -16.3 9.2 -0.25 -16.3
  [4,0,-4.2,-0.25,-15.3,-7.2,-0.25,-15.3,-16.2,-0.25,-16.3,9.2,-0.25,-16.3],
// 3 0 -2.2 -0.25 -15.3 -4.2 -0.25 -15.3 9.2 -0.25 -16.3
  [3,0,-2.2,-0.25,-15.3,-4.2,-0.25,-15.3,9.2,-0.25,-16.3],
// 3 0 1.5 -0.25 -15.3 -2.2 -0.25 -15.3 9.2 -0.25 -16.3
  [3,0,1.5,-0.25,-15.3,-2.2,-0.25,-15.3,9.2,-0.25,-16.3],
// 3 0 4.98 -0.25 -15.3 3.93 -0.25 -15.3 9.2 -0.25 -16.3
  [3,0,4.98,-0.25,-15.3,3.93,-0.25,-15.3,9.2,-0.25,-16.3],
// 3 0 5.8 -0.25 -15.1 4.98 -0.25 -15.3 9.2 -0.25 -16.3
  [3,0,5.8,-0.25,-15.1,4.98,-0.25,-15.3,9.2,-0.25,-16.3],
// 3 0 6.3 -0.25 -14.8 5.8 -0.25 -15.1 9.2 -0.25 -16.3
  [3,0,6.3,-0.25,-14.8,5.8,-0.25,-15.1,9.2,-0.25,-16.3],
// 3 0 6.7 -0.25 -14.4 6.3 -0.25 -14.8 9.2 -0.25 -16.3
  [3,0,6.7,-0.25,-14.4,6.3,-0.25,-14.8,9.2,-0.25,-16.3],
// 3 0 6.9 -0.25 -14 6.7 -0.25 -14.4 9.2 -0.25 -16.3
  [3,0,6.9,-0.25,-14,6.7,-0.25,-14.4,9.2,-0.25,-16.3],
// 4 0 6.9 -0.25 -13.5 6.9 -0.25 -14 9.2 -0.25 -16.3 9.2 -0.25 -11.1
  [4,0,6.9,-0.25,-13.5,6.9,-0.25,-14,9.2,-0.25,-16.3,9.2,-0.25,-11.1],
// 3 0 9.2 -0.25 -11.1 6.6 -0.25 -13.1 6.9 -0.25 -13.5
  [3,0,9.2,-0.25,-11.1,6.6,-0.25,-13.1,6.9,-0.25,-13.5],
// 3 0 9.2 -0.25 -11.1 6.2 -0.25 -12.8 6.6 -0.25 -13.1
  [3,0,9.2,-0.25,-11.1,6.2,-0.25,-12.8,6.6,-0.25,-13.1],
// 3 0 9.2 -0.25 -11.1 5.7 -0.25 -12.5 6.2 -0.25 -12.8
  [3,0,9.2,-0.25,-11.1,5.7,-0.25,-12.5,6.2,-0.25,-12.8],
// 3 0 9.2 -0.25 -11.1 5.04 -0.25 -12.3 5.7 -0.25 -12.5
  [3,0,9.2,-0.25,-11.1,5.04,-0.25,-12.3,5.7,-0.25,-12.5],
// 3 0 9.2 -0.25 -11.1 3.8 -0.25 -12.3 5.04 -0.25 -12.3
  [3,0,9.2,-0.25,-11.1,3.8,-0.25,-12.3,5.04,-0.25,-12.3],
// 3 0 9.2 -0.25 -11.1 -2.2 -0.25 -12.3 1.5 -0.25 -12.3
  [3,0,9.2,-0.25,-11.1,-2.2,-0.25,-12.3,1.5,-0.25,-12.3],
// 4 0 -4.2 -0.25 -12.3 9.2 -0.25 -11.1 -16.2 -0.25 -11.1 -7.2 -0.25 -12.3
  [4,0,-4.2,-0.25,-12.3,9.2,-0.25,-11.1,-16.2,-0.25,-11.1,-7.2,-0.25,-12.3],
// 3 0 -16.2 -0.25 -11.1 -7.9 -0.25 -12.3 -7.2 -0.25 -12.3
  [3,0,-16.2,-0.25,-11.1,-7.9,-0.25,-12.3,-7.2,-0.25,-12.3],
// 3 0 -16.2 -0.25 -11.1 -9 -0.25 -12.3 -7.9 -0.25 -12.3
  [3,0,-16.2,-0.25,-11.1,-9,-0.25,-12.3,-7.9,-0.25,-12.3],
// 3 0 -16.2 -0.25 -11.1 -12.76 -0.25 -12.3 -10.6 -0.25 -12.3
  [3,0,-16.2,-0.25,-11.1,-12.76,-0.25,-12.3,-10.6,-0.25,-12.3],
// 3 0 -16.2 -0.25 -11.1 -14.06 -0.25 -12.3 -12.76 -0.25 -12.3
  [3,0,-16.2,-0.25,-11.1,-14.06,-0.25,-12.3,-12.76,-0.25,-12.3],
// 3 0 -16.2 -0.25 -11.1 -9.3 -0.25 -12.3 -9 -0.25 -12.3
  [3,0,-16.2,-0.25,-11.1,-9.3,-0.25,-12.3,-9,-0.25,-12.3],
// 3 0 -16.2 -0.25 -11.1 -10.6 -0.25 -12.3 -9.3 -0.25 -12.3
  [3,0,-16.2,-0.25,-11.1,-10.6,-0.25,-12.3,-9.3,-0.25,-12.3],
// 4 0 -17.4 -0.25 -10 -17.4 -0.25 -17.4 -17 -0.25 -17 -17 -0.25 -10.4
  [4,0,-17.4,-0.25,-10,-17.4,-0.25,-17.4,-17,-0.25,-17,-17,-0.25,-10.4],
// 4 0 -17 -0.25 -17 -17.4 -0.25 -17.4 10.4 -0.25 -17.4 10 -0.25 -17
  [4,0,-17,-0.25,-17,-17.4,-0.25,-17.4,10.4,-0.25,-17.4,10,-0.25,-17],
// 4 0 10 -0.25 -10.4 10 -0.25 -17 10.4 -0.25 -17.4 10.4 -0.25 -10
  [4,0,10,-0.25,-10.4,10,-0.25,-17,10.4,-0.25,-17.4,10.4,-0.25,-10],
// 4 0 -17.4 -0.25 -10 -17 -0.25 -10.4 10 -0.25 -10.4 10.4 -0.25 -10
  [4,0,-17.4,-0.25,-10,-17,-0.25,-10.4,10,-0.25,-10.4,10.4,-0.25,-10],
// 0 //
// 4 15 5.6 -0.25 -13.6 5.6 -0.25 -14 6.9 -0.25 -14 6.9 -0.25 -13.5
  [4,15,5.6,-0.25,-13.6,5.6,-0.25,-14,6.9,-0.25,-14,6.9,-0.25,-13.5],
// 4 15 5.6 -0.25 -13.6 6.9 -0.25 -13.5 6.6 -0.25 -13.1 5.4 -0.25 -13.3
  [4,15,5.6,-0.25,-13.6,6.9,-0.25,-13.5,6.6,-0.25,-13.1,5.4,-0.25,-13.3],
// 4 15 5.4 -0.25 -13.3 6.6 -0.25 -13.1 6.2 -0.25 -12.8 5.1 -0.25 -13.04
  [4,15,5.4,-0.25,-13.3,6.6,-0.25,-13.1,6.2,-0.25,-12.8,5.1,-0.25,-13.04],
// 4 15 5.1 -0.25 -13.04 6.2 -0.25 -12.8 5.7 -0.25 -12.5 4.6 -0.25 -12.9
  [4,15,5.1,-0.25,-13.04,6.2,-0.25,-12.8,5.7,-0.25,-12.5,4.6,-0.25,-12.9],
// 4 15 4.6 -0.25 -12.9 5.7 -0.25 -12.5 5.04 -0.25 -12.3 4 -0.25 -12.9
  [4,15,4.6,-0.25,-12.9,5.7,-0.25,-12.5,5.04,-0.25,-12.3,4,-0.25,-12.9],
// 4 15 4 -0.25 -12.9 5.04 -0.25 -12.3 3.8 -0.25 -12.3 3.5 -0.25 -13.1
  [4,15,4,-0.25,-12.9,5.04,-0.25,-12.3,3.8,-0.25,-12.3,3.5,-0.25,-13.1],
// 4 15 3.5 -0.25 -13.1 3.8 -0.25 -12.3 3.3 -0.25 -12.4 3.25 -0.25 -13.3
  [4,15,3.5,-0.25,-13.1,3.8,-0.25,-12.3,3.3,-0.25,-12.4,3.25,-0.25,-13.3],
// 4 15 3.25 -0.25 -13.3 3.3 -0.25 -12.4 2.7 -0.25 -12.7 3.1 -0.25 -13.6
  [4,15,3.25,-0.25,-13.3,3.3,-0.25,-12.4,2.7,-0.25,-12.7,3.1,-0.25,-13.6],
// 4 15 3.1 -0.25 -13.6 2.7 -0.25 -12.7 2.3 -0.25 -13 2 -0.25 -13.5
  [4,15,3.1,-0.25,-13.6,2.7,-0.25,-12.7,2.3,-0.25,-13,2,-0.25,-13.5],
// 4 15 3.1 -0.25 -13.6 2 -0.25 -13.5 2 -0.25 -14 3.1 -0.25 -14
  [4,15,3.1,-0.25,-13.6,2,-0.25,-13.5,2,-0.25,-14,3.1,-0.25,-14],
// 4 15 3.1 -0.25 -14 2 -0.25 -14 2.2 -0.25 -14.5 3.2 -0.25 -14.3
  [4,15,3.1,-0.25,-14,2,-0.25,-14,2.2,-0.25,-14.5,3.2,-0.25,-14.3],
// 4 15 3.2 -0.25 -14.3 2.2 -0.25 -14.5 2.7 -0.25 -14.9 3.5 -0.25 -14.53
  [4,15,3.2,-0.25,-14.3,2.2,-0.25,-14.5,2.7,-0.25,-14.9,3.5,-0.25,-14.53],
// 4 15 3.5 -0.25 -14.53 2.7 -0.25 -14.9 3.3 -0.25 -15.2 4 -0.25 -14.72
  [4,15,3.5,-0.25,-14.53,2.7,-0.25,-14.9,3.3,-0.25,-15.2,4,-0.25,-14.72],
// 4 15 4 -0.25 -14.72 3.3 -0.25 -15.2 3.93 -0.25 -15.3 4.6 -0.25 -14.75
  [4,15,4,-0.25,-14.72,3.3,-0.25,-15.2,3.93,-0.25,-15.3,4.6,-0.25,-14.75],
// 4 15 4.6 -0.25 -14.75 3.93 -0.25 -15.3 4.98 -0.25 -15.3 5.07 -0.25 -14.6
  [4,15,4.6,-0.25,-14.75,3.93,-0.25,-15.3,4.98,-0.25,-15.3,5.07,-0.25,-14.6],
// 4 15 5.07 -0.25 -14.6 4.98 -0.25 -15.3 5.8 -0.25 -15.1 5.4 -0.25 -14.4
  [4,15,5.07,-0.25,-14.6,4.98,-0.25,-15.3,5.8,-0.25,-15.1,5.4,-0.25,-14.4],
// 4 15 5.4 -0.25 -14.4 5.8 -0.25 -15.1 6.3 -0.25 -14.8 5.6 -0.25 -14
  [4,15,5.4,-0.25,-14.4,5.8,-0.25,-15.1,6.3,-0.25,-14.8,5.6,-0.25,-14],
// 4 15 5.6 -0.25 -14 6.3 -0.25 -14.8 6.7 -0.25 -14.4 6.9 -0.25 -14
  [4,15,5.6,-0.25,-14,6.3,-0.25,-14.8,6.7,-0.25,-14.4,6.9,-0.25,-14],
// 4 15 -2.2 -0.25 -12.3 -1.2 -0.25 -13 1.5 -0.25 -13 1.5 -0.25 -12.3
  [4,15,-2.2,-0.25,-12.3,-1.2,-0.25,-13,1.5,-0.25,-13,1.5,-0.25,-12.3],
// 4 15 1.3 -0.25 -13.5 -1.2 -0.25 -13.5 -1.2 -0.25 -14 1.3 -0.25 -14
  [4,15,1.3,-0.25,-13.5,-1.2,-0.25,-13.5,-1.2,-0.25,-14,1.3,-0.25,-14],
// 4 15 -1.2 -0.25 -14.7 -2.2 -0.25 -15.3 1.5 -0.25 -15.3 1.5 -0.25 -14.7
  [4,15,-1.2,-0.25,-14.7,-2.2,-0.25,-15.3,1.5,-0.25,-15.3,1.5,-0.25,-14.7],
// 3 15 -1.2 -0.25 -14 -2.2 -0.25 -15.3 -1.2 -0.25 -14.7
  [3,15,-1.2,-0.25,-14,-2.2,-0.25,-15.3,-1.2,-0.25,-14.7],
// 4 15 -2.2 -0.25 -15.3 -1.2 -0.25 -14 -1.2 -0.25 -13.5 -2.2 -0.25 -12.3
  [4,15,-2.2,-0.25,-15.3,-1.2,-0.25,-14,-1.2,-0.25,-13.5,-2.2,-0.25,-12.3],
// 3 15 -2.2 -0.25 -12.3 -1.2 -0.25 -13.5 -1.2 -0.25 -13
  [3,15,-2.2,-0.25,-12.3,-1.2,-0.25,-13.5,-1.2,-0.25,-13],
// 4 15 -7.2 -0.25 -12.3 -7.2 -0.25 -15.3 -6 -0.25 -14.7 -6 -0.25 -13
  [4,15,-7.2,-0.25,-12.3,-7.2,-0.25,-15.3,-6,-0.25,-14.7,-6,-0.25,-13],
// 4 15 -4.2 -0.25 -12.3 -4.8 -0.25 -13 -4.3 -0.25 -13.2 -3.8 -0.25 -12.46
  [4,15,-4.2,-0.25,-12.3,-4.8,-0.25,-13,-4.3,-0.25,-13.2,-3.8,-0.25,-12.46],
// 4 15 -3.35 -0.25 -12.69 -3.8 -0.25 -12.46 -4.3 -0.25 -13.2 -4 -0.25 -13.6
  [4,15,-3.35,-0.25,-12.69,-3.8,-0.25,-12.46,-4.3,-0.25,-13.2,-4,-0.25,-13.6],
// 4 15 -3.02 -0.25 -13.04 -3.35 -0.25 -12.69 -4 -0.25 -13.6 -2.87 -0.25 -13.51
  [4,15,-3.02,-0.25,-13.04,-3.35,-0.25,-12.69,-4,-0.25,-13.6,-2.87,-0.25,-13.51],
// 4 15 -2.87 -0.25 -13.51 -4 -0.25 -13.6 -4 -0.25 -14 -2.88 -0.25 -14.14
  [4,15,-2.87,-0.25,-13.51,-4,-0.25,-13.6,-4,-0.25,-14,-2.88,-0.25,-14.14],
// 4 15 -2.88 -0.25 -14.14 -4 -0.25 -14 -4.1 -0.25 -14.3 -3.08 -0.25 -14.52
  [4,15,-2.88,-0.25,-14.14,-4,-0.25,-14,-4.1,-0.25,-14.3,-3.08,-0.25,-14.52],
// 4 15 -3.37 -0.25 -14.84 -3.08 -0.25 -14.52 -4.1 -0.25 -14.3 -4.4 -0.25 -14.6
  [4,15,-3.37,-0.25,-14.84,-3.08,-0.25,-14.52,-4.1,-0.25,-14.3,-4.4,-0.25,-14.6],
// 4 15 -3.78 -0.25 -15.12 -3.37 -0.25 -14.84 -4.4 -0.25 -14.6 -4.8 -0.25 -14.7
  [4,15,-3.78,-0.25,-15.12,-3.37,-0.25,-14.84,-4.4,-0.25,-14.6,-4.8,-0.25,-14.7],
// 4 15 -4.2 -0.25 -15.3 -3.78 -0.25 -15.12 -4.8 -0.25 -14.7 -7.2 -0.25 -15.3
  [4,15,-4.2,-0.25,-15.3,-3.78,-0.25,-15.12,-4.8,-0.25,-14.7,-7.2,-0.25,-15.3],
// 3 15 -4.8 -0.25 -14.7 -6 -0.25 -14.7 -7.2 -0.25 -15.3
  [3,15,-4.8,-0.25,-14.7,-6,-0.25,-14.7,-7.2,-0.25,-15.3],
// 4 15 -6 -0.25 -13 -4.8 -0.25 -13 -4.2 -0.25 -12.3 -7.2 -0.25 -12.3
  [4,15,-6,-0.25,-13,-4.8,-0.25,-13,-4.2,-0.25,-12.3,-7.2,-0.25,-12.3],
// 4 15 -7.9 -0.25 -12.3 -9 -0.25 -12.3 -9 -0.25 -15.3 -7.9 -0.25 -15.3
  [4,15,-7.9,-0.25,-12.3,-9,-0.25,-12.3,-9,-0.25,-15.3,-7.9,-0.25,-15.3],
// 4 15 -14.06 -0.25 -12.3 -12.3 -0.25 -15.3 -11.68 -0.25 -14.3 -12.76 -0.25 -12.3
  [4,15,-14.06,-0.25,-12.3,-12.3,-0.25,-15.3,-11.68,-0.25,-14.3,-12.76,-0.25,-12.3],
// 4 15 -10.6 -0.25 -12.3 -11.68 -0.25 -14.3 -11.1 -0.25 -15.3 -9.3 -0.25 -12.3
  [4,15,-10.6,-0.25,-12.3,-11.68,-0.25,-14.3,-11.1,-0.25,-15.3,-9.3,-0.25,-12.3],
// 3 15 -11.68 -0.25 -14.3 -12.3 -0.25 -15.3 -11.1 -0.25 -15.3
  [3,15,-11.68,-0.25,-14.3,-12.3,-0.25,-15.3,-11.1,-0.25,-15.3],
// 1 4 15.3 -0.25 -13.2 1.8 0 0 0 1 0 0 0 1.8 4-4disc.dat
  [1,4,15.3,-0.25,-13.2,1.8,0,0,0,1,0,0,0,1.8, ldraw_lib__4_4disc()],
// 4 9 16 -0.25 16 -16 -0.25 16 -16 -0.25 -7 16 -0.25 -7
  [4,9,16,-0.25,16,-16,-0.25,16,-16,-0.25,-7,16,-0.25,-7],
// 0 //
// 1 7 -16 -0.25 16 0 0 -1 0 1 0 1 0 0 1-4ndis.dat
  [1,7,-16,-0.25,16,0,0,-1,0,1,0,1,0,0, ldraw_lib__1_4ndis()],
// 1 7 16 -0.25 16 1 0 0 0 1 0 0 0 1 1-4ndis.dat
  [1,7,16,-0.25,16,1,0,0,0,1,0,0,0,1, ldraw_lib__1_4ndis()],
// 1 7 -16 -0.25 -7 -1 0 0 0 1 0 0 0 -1 1-4ndis.dat
  [1,7,-16,-0.25,-7,-1,0,0,0,1,0,0,0,-1, ldraw_lib__1_4ndis()],
// 1 7 16 -0.25 -7 0 0 1 0 1 0 -1 0 0 1-4ndis.dat
  [1,7,16,-0.25,-7,0,0,1,0,1,0,-1,0,0, ldraw_lib__1_4ndis()],
// 1 7 15.3 -0.25 -13.2 2.6 0 0 0 1 0 0 0 2.6 4-4ndis.dat
  [1,7,15.3,-0.25,-13.2,2.6,0,0,0,1,0,0,0,2.6, ldraw_lib__4_4ndis()],
// 4 7 -17 -0.25 -10.4 -16.2 -0.25 -11.1 9.2 -0.25 -11.1 10 -0.25 -10.4
  [4,7,-17,-0.25,-10.4,-16.2,-0.25,-11.1,9.2,-0.25,-11.1,10,-0.25,-10.4],
// 4 7 9.2 -0.25 -11.1 9.2 -0.25 -16.3 10 -0.25 -17 10 -0.25 -10.4
  [4,7,9.2,-0.25,-11.1,9.2,-0.25,-16.3,10,-0.25,-17,10,-0.25,-10.4],
// 4 7 -17 -0.25 -10.4 -17 -0.25 -17 -16.2 -0.25 -16.3 -16.2 -0.25 -11.1
  [4,7,-17,-0.25,-10.4,-17,-0.25,-17,-16.2,-0.25,-16.3,-16.2,-0.25,-11.1],
// 4 7 -16.2 -0.25 -16.3 -17 -0.25 -17 10 -0.25 -17 9.2 -0.25 -16.3
  [4,7,-16.2,-0.25,-16.3,-17,-0.25,-17,10,-0.25,-17,9.2,-0.25,-16.3],
// 4 7 12.7 -0.25 -13.2 12.7 -0.25 -10.6 10.4 -0.25 -10 10.4 -0.25 -17.4
  [4,7,12.7,-0.25,-13.2,12.7,-0.25,-10.6,10.4,-0.25,-10,10.4,-0.25,-17.4],
// 3 7 12.7 -0.25 -13.2 10.4 -0.25 -17.4 12.7 -0.25 -15.8
  [3,7,12.7,-0.25,-13.2,10.4,-0.25,-17.4,12.7,-0.25,-15.8],
// 4 7 15.3 -0.25 -15.8 12.7 -0.25 -15.8 10.4 -0.25 -17.4 19 -0.25 -19
  [4,7,15.3,-0.25,-15.8,12.7,-0.25,-15.8,10.4,-0.25,-17.4,19,-0.25,-19],
// 3 7 17.9 -0.25 -15.8 15.3 -0.25 -15.8 19 -0.25 -19
  [3,7,17.9,-0.25,-15.8,15.3,-0.25,-15.8,19,-0.25,-19],
// 3 7 17.9 -0.25 -13.2 17.9 -0.25 -15.8 19 -0.25 -19
  [3,7,17.9,-0.25,-13.2,17.9,-0.25,-15.8,19,-0.25,-19],
// 4 7 17.9 -0.25 -10.6 17.9 -0.25 -13.2 19 -0.25 -19 19 -0.25 19
  [4,7,17.9,-0.25,-10.6,17.9,-0.25,-13.2,19,-0.25,-19,19,-0.25,19],
// 4 7 16 -0.25 -8 10.4 -0.25 -10 12.7 -0.25 -10.6 15.3 -0.25 -10.6
  [4,7,16,-0.25,-8,10.4,-0.25,-10,12.7,-0.25,-10.6,15.3,-0.25,-10.6],
// 4 7 17 -0.25 -8 16 -0.25 -8 15.3 -0.25 -10.6 17.9 -0.25 -10.6
  [4,7,17,-0.25,-8,16,-0.25,-8,15.3,-0.25,-10.6,17.9,-0.25,-10.6],
// 4 7 17 -0.25 -7 17 -0.25 -8 17.9 -0.25 -10.6 19 -0.25 19
  [4,7,17,-0.25,-7,17,-0.25,-8,17.9,-0.25,-10.6,19,-0.25,19],
// 4 7 10.4 -0.25 -10 16 -0.25 -8 -16 -0.25 -8 -17.4 -0.25 -10
  [4,7,10.4,-0.25,-10,16,-0.25,-8,-16,-0.25,-8,-17.4,-0.25,-10],
// 3 7 -16 -0.25 -8 -17 -0.25 -8 -17.4 -0.25 -10
  [3,7,-16,-0.25,-8,-17,-0.25,-8,-17.4,-0.25,-10],
// 4 7 19 -0.25 -19 10.4 -0.25 -17.4 -17.4 -0.25 -17.4 -19 -0.25 -19
  [4,7,19,-0.25,-19,10.4,-0.25,-17.4,-17.4,-0.25,-17.4,-19,-0.25,-19],
// 4 7 -19 -0.25 -19 -17.4 -0.25 -17.4 -17.4 -0.25 -10 -19 -0.25 19
  [4,7,-19,-0.25,-19,-17.4,-0.25,-17.4,-17.4,-0.25,-10,-19,-0.25,19],
// 3 7 -19 -0.25 19 -17 -0.25 17 -16 -0.25 17
  [3,7,-19,-0.25,19,-17,-0.25,17,-16,-0.25,17],
// 4 7 -19 -0.25 19 -16 -0.25 17 16 -0.25 17 19 -0.25 19
  [4,7,-19,-0.25,19,-16,-0.25,17,16,-0.25,17,19,-0.25,19],
// 3 7 19 -0.25 19 16 -0.25 17 17 -0.25 17
  [3,7,19,-0.25,19,16,-0.25,17,17,-0.25,17],
// 3 7 19 -0.25 19 17 -0.25 17 17 -0.25 16
  [3,7,19,-0.25,19,17,-0.25,17,17,-0.25,16],
// 3 7 19 -0.25 19 17 -0.25 16 17 -0.25 -7
  [3,7,19,-0.25,19,17,-0.25,16,17,-0.25,-7],
// 3 7 -19 -0.25 19 -17 -0.25 16 -17 -0.25 17
  [3,7,-19,-0.25,19,-17,-0.25,16,-17,-0.25,17],
// 3 7 -19 -0.25 19 -17 -0.25 -7 -17 -0.25 16
  [3,7,-19,-0.25,19,-17,-0.25,-7,-17,-0.25,16],
// 4 7 -17 -0.25 -8 -17 -0.25 -7 -19 -0.25 19 -17.4 -0.25 -10
  [4,7,-17,-0.25,-8,-17,-0.25,-7,-19,-0.25,19,-17.4,-0.25,-10],
];
module ldraw_lib__4100418h(step=0, col=false, unit=2/5, alt=false, line=0.2, solid=!$preview)
    makepoly(ldraw_lib__4100418h(), step=step, col=col, unit=unit, alt=alt, line=line, solid=solid);
ldraw_lib__4100418h(line=0.2);
